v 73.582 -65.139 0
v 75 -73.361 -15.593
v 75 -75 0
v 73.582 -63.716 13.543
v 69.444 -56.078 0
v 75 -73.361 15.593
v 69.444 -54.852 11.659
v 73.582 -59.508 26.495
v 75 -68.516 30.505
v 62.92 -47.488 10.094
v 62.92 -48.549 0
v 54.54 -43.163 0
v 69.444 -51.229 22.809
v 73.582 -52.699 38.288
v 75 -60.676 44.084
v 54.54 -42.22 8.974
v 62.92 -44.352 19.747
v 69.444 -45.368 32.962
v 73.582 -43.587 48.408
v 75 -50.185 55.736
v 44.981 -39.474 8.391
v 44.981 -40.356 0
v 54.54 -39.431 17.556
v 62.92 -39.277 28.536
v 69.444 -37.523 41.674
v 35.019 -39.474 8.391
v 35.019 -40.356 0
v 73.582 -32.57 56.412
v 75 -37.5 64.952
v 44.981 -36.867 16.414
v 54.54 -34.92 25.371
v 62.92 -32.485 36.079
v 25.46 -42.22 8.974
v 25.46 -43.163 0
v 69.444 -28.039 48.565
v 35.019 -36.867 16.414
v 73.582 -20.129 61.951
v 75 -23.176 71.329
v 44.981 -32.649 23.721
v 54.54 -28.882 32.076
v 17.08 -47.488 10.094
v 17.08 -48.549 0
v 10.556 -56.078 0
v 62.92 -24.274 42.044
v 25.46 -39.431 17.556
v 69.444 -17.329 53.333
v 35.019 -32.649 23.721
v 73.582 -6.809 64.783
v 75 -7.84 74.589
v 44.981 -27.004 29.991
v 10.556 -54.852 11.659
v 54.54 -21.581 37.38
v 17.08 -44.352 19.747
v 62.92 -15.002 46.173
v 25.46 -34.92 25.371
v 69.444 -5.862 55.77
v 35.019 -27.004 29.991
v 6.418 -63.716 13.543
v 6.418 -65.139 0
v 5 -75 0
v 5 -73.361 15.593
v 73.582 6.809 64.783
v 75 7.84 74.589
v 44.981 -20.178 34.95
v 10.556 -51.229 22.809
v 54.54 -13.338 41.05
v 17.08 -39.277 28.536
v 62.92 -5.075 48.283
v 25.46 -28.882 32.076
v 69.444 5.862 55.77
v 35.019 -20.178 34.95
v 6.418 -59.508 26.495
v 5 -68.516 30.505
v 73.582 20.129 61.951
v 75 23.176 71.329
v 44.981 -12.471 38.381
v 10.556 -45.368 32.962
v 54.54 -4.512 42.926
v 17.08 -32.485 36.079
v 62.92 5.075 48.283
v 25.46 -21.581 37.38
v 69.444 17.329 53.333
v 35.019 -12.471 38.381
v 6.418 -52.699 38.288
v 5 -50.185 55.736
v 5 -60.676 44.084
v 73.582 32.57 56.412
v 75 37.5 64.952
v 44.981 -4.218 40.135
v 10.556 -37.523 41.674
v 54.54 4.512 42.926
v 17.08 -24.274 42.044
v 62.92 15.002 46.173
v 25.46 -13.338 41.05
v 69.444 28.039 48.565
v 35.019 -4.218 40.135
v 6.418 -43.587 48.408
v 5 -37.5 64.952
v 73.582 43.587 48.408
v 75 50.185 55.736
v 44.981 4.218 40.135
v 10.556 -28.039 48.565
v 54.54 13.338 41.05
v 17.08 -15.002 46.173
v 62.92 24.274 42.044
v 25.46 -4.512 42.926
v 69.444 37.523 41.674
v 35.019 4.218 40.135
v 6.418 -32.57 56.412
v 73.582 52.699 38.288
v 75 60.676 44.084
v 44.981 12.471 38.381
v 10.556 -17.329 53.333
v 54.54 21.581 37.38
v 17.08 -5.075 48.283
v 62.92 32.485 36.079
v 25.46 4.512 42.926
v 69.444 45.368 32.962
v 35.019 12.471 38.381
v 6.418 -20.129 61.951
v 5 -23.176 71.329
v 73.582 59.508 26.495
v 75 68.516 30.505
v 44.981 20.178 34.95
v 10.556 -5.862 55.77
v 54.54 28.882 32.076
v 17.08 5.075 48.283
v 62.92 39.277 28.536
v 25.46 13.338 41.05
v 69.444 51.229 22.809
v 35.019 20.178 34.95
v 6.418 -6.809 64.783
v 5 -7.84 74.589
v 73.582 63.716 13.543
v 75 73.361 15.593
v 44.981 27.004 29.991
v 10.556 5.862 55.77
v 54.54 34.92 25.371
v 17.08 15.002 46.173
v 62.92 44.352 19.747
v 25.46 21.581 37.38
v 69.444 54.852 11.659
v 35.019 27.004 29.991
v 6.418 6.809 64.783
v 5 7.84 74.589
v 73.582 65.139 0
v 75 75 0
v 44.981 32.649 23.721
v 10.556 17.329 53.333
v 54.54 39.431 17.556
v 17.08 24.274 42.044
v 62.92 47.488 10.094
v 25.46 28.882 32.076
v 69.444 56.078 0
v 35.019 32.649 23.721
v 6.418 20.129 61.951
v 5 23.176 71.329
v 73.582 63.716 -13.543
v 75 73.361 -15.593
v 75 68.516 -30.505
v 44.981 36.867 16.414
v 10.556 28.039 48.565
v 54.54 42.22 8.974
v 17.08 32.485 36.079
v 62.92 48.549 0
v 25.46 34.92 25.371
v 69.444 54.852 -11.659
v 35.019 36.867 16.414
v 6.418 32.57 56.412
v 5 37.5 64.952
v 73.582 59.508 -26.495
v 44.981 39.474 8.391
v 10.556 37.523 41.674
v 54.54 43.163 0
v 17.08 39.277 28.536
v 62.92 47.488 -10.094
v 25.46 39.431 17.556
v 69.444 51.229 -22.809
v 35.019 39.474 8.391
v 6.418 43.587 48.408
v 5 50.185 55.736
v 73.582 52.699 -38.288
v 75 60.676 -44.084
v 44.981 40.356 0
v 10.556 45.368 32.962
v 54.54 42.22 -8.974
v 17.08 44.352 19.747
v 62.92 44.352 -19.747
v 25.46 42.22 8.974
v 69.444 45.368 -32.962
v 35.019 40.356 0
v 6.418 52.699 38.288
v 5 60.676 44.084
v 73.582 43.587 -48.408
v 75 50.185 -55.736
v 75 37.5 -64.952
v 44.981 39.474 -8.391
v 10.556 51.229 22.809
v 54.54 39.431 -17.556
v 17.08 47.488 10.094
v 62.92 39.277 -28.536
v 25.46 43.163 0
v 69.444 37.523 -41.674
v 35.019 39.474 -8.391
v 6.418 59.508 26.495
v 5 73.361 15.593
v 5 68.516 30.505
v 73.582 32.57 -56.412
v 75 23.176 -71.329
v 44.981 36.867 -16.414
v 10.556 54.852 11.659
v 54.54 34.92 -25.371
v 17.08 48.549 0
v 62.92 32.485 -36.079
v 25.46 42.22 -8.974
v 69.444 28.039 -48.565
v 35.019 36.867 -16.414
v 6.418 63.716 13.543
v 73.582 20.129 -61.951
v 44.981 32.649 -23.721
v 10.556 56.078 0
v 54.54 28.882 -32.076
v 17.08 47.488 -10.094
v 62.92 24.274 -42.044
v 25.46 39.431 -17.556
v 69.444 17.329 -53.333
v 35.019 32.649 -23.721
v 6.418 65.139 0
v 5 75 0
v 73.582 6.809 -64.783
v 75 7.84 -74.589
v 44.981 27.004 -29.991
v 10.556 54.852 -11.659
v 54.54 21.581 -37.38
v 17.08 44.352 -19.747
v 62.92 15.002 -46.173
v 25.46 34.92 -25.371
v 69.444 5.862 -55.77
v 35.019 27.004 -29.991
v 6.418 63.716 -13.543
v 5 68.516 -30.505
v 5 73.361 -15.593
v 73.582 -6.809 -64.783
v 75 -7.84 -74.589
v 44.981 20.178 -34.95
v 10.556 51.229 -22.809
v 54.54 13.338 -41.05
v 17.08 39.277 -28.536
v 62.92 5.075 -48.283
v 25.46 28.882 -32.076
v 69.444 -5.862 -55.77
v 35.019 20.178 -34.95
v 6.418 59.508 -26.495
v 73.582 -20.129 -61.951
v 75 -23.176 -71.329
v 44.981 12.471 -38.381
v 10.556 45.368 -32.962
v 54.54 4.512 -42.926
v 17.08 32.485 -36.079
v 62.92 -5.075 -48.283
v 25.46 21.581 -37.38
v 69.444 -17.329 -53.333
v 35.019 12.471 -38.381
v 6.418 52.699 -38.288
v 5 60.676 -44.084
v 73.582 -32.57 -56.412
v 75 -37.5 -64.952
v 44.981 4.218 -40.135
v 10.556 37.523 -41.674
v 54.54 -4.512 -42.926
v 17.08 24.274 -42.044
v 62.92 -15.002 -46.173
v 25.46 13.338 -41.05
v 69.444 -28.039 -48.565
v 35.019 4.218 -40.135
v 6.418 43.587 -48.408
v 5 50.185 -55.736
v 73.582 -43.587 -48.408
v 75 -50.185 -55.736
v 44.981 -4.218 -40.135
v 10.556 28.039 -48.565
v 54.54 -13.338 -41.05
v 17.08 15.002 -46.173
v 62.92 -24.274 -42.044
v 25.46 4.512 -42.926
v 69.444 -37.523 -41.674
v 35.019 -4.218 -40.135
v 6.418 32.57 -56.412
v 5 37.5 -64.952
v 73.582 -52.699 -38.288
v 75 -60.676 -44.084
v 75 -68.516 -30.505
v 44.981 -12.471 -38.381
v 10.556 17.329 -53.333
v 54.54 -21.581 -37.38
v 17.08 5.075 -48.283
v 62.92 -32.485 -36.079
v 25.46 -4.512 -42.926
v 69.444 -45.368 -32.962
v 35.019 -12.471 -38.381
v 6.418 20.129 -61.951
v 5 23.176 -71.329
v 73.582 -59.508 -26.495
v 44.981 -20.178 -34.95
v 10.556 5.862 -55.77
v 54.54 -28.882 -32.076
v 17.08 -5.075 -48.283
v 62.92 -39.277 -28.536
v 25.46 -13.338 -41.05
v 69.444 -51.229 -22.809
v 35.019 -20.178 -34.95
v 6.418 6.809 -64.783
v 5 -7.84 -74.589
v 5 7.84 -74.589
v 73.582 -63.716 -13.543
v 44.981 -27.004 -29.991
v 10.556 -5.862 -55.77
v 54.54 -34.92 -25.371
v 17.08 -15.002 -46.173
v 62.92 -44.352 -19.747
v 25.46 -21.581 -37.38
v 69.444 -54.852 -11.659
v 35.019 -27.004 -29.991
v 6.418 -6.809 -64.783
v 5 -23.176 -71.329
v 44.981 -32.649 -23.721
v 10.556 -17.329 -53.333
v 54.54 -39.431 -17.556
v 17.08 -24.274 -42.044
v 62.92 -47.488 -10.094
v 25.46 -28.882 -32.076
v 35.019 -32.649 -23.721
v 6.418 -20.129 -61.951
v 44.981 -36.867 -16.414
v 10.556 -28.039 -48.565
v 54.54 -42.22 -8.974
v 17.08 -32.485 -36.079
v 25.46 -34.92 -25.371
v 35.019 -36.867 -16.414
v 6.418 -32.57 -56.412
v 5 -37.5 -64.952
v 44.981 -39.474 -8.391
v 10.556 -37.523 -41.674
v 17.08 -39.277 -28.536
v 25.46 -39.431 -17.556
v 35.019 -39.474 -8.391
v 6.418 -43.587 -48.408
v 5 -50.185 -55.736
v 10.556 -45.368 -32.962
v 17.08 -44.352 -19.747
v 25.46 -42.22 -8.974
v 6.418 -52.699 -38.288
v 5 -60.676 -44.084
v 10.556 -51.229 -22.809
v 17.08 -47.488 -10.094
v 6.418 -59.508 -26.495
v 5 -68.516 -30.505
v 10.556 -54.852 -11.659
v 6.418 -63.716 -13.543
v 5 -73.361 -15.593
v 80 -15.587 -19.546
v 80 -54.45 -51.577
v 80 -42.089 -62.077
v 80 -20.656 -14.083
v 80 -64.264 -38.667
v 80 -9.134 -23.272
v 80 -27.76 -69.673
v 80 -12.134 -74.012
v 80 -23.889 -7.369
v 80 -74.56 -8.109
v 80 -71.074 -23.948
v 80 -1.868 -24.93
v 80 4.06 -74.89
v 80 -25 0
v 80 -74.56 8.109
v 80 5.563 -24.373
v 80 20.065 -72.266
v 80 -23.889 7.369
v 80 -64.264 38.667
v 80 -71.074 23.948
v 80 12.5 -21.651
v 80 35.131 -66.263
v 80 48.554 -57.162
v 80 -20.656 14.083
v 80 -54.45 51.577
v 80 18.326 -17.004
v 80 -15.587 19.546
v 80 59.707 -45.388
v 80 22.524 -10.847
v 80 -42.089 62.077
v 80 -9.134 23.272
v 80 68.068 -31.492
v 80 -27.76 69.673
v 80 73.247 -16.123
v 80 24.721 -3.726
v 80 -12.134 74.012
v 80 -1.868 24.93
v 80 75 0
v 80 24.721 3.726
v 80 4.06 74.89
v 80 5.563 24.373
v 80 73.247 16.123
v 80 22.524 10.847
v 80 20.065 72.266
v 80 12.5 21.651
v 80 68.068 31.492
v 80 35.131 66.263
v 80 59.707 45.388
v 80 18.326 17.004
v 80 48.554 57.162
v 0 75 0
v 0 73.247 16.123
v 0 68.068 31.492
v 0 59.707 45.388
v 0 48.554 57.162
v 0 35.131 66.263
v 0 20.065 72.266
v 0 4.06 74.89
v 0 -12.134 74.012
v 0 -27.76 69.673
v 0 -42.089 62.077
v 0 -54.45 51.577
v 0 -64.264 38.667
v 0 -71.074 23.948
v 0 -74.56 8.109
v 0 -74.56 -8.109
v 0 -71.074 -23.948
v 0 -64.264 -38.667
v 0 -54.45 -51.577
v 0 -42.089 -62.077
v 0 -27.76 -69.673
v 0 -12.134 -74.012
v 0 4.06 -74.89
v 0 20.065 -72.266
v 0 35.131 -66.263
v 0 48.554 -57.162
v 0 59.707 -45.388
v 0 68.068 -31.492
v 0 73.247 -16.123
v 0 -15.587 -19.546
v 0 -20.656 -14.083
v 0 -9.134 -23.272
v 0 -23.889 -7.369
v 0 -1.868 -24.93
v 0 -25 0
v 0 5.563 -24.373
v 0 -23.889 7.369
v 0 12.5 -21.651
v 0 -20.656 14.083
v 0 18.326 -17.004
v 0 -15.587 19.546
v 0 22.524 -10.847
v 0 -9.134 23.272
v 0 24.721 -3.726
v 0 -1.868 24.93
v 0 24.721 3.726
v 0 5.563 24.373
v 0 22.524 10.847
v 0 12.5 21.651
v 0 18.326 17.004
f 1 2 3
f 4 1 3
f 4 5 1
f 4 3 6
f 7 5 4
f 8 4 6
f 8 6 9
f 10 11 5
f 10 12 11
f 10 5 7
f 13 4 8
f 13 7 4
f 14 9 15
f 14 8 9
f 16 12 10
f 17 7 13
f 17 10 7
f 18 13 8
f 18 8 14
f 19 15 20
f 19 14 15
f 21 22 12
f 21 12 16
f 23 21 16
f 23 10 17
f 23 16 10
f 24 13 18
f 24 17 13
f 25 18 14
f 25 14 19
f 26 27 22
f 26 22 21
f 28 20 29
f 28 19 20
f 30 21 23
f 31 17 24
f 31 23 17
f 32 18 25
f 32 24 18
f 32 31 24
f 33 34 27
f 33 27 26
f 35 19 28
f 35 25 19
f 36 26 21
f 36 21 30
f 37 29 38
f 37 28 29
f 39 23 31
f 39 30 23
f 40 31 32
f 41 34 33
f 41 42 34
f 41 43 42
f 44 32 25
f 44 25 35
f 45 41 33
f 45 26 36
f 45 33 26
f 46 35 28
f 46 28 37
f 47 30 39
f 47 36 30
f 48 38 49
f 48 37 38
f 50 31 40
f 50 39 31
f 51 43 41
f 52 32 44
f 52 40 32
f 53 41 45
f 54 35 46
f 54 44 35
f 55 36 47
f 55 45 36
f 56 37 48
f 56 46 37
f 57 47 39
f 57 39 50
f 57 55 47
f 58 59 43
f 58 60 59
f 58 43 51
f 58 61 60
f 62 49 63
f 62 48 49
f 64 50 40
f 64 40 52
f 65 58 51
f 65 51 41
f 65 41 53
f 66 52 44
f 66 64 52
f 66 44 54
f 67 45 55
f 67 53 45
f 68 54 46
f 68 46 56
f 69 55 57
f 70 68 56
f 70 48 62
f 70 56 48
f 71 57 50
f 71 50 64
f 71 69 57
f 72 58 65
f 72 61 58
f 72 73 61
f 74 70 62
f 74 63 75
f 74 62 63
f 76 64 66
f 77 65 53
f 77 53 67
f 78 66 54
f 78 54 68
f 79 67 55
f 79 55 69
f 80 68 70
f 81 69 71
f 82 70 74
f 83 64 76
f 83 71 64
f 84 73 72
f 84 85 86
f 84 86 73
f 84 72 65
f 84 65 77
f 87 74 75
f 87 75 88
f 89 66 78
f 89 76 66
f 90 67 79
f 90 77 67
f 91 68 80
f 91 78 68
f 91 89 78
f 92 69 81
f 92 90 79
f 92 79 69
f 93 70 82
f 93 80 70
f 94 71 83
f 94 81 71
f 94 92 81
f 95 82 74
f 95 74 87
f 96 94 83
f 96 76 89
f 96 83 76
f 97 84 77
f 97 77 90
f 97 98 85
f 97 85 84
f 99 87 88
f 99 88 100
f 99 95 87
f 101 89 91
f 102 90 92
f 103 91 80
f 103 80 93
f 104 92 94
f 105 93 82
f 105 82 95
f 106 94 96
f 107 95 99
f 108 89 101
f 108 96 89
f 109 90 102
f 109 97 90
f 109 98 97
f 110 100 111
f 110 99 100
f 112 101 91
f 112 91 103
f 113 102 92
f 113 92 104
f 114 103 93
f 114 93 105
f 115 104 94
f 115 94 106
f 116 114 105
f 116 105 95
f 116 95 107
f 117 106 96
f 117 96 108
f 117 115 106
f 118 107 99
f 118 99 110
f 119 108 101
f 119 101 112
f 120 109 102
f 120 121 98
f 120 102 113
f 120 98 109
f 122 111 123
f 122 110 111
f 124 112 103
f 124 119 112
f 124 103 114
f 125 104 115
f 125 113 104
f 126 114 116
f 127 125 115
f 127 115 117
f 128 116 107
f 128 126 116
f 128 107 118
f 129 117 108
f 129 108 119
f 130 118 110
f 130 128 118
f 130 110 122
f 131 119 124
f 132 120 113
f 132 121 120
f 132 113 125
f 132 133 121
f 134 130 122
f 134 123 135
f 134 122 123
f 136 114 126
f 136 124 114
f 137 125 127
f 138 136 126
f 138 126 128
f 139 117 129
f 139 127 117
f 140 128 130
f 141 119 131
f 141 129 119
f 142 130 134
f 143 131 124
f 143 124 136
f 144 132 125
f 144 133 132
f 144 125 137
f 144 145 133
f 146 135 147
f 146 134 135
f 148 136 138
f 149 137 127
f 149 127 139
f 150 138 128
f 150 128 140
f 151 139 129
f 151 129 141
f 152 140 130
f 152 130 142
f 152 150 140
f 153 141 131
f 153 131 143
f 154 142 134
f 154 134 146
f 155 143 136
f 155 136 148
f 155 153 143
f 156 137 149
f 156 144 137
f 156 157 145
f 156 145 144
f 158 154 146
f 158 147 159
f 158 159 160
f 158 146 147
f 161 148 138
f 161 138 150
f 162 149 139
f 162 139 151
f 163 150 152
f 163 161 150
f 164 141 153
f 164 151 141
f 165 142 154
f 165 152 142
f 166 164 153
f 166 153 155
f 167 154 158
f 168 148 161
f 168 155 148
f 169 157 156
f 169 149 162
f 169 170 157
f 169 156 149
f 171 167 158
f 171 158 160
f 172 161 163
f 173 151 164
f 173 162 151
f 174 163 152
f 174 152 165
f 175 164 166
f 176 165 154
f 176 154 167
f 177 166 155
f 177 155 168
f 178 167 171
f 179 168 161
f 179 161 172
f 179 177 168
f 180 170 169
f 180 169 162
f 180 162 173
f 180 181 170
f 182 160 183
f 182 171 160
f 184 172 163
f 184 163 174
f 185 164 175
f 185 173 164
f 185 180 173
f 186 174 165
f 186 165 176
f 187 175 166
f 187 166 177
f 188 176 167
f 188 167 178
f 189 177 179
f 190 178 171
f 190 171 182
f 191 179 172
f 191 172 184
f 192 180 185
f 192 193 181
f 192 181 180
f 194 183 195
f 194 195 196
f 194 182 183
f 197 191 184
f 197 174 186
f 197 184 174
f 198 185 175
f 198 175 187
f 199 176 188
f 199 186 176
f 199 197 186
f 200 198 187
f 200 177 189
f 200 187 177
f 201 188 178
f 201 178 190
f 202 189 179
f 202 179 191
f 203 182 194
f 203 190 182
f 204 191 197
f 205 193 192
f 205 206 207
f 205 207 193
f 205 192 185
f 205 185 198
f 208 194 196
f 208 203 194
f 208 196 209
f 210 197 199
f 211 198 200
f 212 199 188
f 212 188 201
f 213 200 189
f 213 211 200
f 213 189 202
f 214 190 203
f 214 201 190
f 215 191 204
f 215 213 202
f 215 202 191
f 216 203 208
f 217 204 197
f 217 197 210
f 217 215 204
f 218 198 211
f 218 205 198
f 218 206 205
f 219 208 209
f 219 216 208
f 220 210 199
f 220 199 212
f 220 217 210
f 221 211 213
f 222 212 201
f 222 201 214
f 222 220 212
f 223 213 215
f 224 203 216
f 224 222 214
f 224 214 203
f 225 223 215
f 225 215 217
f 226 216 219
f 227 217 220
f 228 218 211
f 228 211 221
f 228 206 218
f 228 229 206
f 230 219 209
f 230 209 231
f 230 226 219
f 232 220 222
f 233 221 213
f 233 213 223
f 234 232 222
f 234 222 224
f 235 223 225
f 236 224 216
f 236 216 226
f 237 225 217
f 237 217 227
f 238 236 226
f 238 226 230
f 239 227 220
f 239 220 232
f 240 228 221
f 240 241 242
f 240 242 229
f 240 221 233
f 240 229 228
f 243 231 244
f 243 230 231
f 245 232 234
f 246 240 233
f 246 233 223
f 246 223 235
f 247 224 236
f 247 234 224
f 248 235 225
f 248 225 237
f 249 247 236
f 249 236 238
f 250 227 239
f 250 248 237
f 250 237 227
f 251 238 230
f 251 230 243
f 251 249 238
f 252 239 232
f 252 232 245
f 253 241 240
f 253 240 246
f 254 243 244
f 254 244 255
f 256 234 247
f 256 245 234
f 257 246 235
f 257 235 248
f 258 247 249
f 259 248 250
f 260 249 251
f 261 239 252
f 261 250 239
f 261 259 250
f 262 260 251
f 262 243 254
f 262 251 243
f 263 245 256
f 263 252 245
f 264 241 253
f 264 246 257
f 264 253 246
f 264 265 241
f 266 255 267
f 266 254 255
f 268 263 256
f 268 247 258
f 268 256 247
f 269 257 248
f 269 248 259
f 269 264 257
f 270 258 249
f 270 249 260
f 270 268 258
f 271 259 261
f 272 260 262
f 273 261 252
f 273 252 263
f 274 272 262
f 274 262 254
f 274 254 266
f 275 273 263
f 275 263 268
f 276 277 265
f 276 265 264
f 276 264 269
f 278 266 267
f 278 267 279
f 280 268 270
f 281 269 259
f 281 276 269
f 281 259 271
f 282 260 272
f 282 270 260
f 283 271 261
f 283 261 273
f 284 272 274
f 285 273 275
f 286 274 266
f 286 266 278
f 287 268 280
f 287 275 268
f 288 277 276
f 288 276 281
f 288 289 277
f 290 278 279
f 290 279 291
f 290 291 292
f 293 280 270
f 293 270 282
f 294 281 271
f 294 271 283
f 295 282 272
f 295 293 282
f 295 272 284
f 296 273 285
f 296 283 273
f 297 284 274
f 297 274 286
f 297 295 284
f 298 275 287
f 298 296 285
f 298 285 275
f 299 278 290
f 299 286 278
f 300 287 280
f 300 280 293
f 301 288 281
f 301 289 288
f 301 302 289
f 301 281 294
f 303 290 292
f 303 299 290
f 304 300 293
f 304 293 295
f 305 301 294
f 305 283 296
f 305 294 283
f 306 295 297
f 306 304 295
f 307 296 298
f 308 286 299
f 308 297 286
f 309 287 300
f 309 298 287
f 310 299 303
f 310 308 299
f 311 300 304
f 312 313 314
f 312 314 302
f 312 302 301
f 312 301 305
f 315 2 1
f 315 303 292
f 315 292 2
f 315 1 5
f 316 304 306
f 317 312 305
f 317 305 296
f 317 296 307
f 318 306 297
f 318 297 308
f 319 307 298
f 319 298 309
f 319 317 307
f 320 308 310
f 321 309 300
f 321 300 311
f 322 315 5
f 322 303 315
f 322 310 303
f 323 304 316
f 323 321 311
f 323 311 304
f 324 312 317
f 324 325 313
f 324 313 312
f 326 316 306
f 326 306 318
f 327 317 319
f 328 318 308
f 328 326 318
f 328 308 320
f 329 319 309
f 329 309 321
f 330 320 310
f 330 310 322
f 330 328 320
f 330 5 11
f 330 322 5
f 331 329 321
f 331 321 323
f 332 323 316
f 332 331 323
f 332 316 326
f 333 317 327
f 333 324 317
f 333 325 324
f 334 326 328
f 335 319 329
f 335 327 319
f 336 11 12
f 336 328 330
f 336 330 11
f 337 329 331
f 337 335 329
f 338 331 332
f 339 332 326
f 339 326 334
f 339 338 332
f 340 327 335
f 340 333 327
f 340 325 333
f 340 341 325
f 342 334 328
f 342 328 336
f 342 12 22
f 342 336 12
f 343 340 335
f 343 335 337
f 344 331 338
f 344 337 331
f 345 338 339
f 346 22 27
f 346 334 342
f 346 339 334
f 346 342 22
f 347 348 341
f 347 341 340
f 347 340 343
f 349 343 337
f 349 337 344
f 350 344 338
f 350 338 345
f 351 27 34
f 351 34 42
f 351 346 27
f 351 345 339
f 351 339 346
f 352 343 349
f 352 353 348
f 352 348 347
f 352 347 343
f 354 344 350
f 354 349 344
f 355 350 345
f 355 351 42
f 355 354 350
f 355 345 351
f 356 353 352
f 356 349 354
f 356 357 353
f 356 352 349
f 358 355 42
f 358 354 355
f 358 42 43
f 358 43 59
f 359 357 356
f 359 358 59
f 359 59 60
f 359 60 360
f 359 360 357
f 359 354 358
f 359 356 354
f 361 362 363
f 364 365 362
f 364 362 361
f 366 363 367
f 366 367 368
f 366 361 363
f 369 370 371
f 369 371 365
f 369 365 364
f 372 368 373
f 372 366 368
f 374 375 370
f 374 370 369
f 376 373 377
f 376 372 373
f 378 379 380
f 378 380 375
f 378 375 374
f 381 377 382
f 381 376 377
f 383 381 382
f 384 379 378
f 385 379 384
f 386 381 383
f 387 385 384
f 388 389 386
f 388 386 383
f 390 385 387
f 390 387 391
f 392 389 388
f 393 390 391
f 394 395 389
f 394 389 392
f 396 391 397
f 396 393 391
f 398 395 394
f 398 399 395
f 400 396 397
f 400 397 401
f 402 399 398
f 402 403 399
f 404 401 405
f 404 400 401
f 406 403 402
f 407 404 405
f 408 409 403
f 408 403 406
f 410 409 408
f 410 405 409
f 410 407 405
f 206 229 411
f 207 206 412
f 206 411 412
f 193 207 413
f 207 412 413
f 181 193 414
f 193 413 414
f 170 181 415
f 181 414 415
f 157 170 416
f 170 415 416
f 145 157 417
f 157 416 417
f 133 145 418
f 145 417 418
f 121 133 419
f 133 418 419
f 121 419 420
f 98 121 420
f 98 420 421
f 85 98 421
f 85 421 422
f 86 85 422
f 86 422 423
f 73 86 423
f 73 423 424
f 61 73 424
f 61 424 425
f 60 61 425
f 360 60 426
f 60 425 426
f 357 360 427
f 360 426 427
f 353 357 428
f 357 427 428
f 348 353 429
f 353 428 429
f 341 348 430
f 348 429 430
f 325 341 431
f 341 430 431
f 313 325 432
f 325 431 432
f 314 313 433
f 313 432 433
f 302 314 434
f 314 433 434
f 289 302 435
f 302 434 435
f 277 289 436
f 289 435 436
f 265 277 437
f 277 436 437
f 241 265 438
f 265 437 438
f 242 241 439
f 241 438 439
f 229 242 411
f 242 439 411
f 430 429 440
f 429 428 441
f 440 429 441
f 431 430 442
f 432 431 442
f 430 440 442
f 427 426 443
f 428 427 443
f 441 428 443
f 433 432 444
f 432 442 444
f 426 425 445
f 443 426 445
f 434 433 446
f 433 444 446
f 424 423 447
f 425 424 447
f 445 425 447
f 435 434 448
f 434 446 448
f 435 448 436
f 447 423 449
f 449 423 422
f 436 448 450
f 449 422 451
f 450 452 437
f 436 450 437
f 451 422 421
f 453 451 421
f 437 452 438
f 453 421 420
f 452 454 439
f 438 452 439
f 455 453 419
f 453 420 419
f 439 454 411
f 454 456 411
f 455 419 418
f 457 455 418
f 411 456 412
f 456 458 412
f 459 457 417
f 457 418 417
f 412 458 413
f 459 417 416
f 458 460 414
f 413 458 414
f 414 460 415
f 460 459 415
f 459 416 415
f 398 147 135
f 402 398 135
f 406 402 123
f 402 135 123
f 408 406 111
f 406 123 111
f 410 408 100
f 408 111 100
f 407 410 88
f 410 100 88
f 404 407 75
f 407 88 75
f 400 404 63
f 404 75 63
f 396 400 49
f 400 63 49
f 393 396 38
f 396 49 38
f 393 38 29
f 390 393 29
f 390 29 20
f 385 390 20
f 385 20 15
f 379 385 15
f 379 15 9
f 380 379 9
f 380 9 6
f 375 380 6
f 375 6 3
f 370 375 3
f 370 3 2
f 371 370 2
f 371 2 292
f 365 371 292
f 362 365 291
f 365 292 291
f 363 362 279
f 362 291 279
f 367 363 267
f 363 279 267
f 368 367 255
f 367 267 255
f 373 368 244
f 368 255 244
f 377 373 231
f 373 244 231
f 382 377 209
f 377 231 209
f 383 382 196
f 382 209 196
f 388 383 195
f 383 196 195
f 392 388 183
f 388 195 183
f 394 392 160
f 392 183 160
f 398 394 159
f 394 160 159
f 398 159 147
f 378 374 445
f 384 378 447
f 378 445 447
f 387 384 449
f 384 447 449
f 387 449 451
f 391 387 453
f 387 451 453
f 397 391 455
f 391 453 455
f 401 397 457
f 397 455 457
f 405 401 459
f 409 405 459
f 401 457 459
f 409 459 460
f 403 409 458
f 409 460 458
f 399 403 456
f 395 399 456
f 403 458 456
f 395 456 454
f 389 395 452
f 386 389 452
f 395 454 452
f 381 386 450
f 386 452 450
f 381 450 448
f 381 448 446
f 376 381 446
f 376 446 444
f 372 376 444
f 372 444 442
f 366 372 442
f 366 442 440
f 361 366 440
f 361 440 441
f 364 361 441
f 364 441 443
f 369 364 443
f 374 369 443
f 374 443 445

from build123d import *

# Parameters (mm, degrees)
F0_R     = 75
F1_DEPTH = 80
F2_R     = 25
F3_DEPTH = 100
F4_R     = 35


with BuildPart() as f1:
    # F0 (on Right) → F1 (new body)
    with BuildSketch(Plane.YZ):
        Circle(F0_R)
    extrude(amount=F1_DEPTH)

    # F2 (on face) → F3 (cut)
    with BuildSketch(Plane(origin=(0, 0, 0), x_dir=(0, -1, 0), z_dir=(-1, 0, 0))):
        Circle(F2_R)
    extrude(amount=-F3_DEPTH, mode=Mode.SUBTRACT)

    # F4 (on Top) → F5 (revolve, cut)
    with BuildSketch(Plane.XY):
        with Locations((40, -75)):
            Circle(F4_R)
    revolve(axis=Axis((0, 0, 0), (-1, 0, 0)), mode=Mode.SUBTRACT)


solid = f1.part
